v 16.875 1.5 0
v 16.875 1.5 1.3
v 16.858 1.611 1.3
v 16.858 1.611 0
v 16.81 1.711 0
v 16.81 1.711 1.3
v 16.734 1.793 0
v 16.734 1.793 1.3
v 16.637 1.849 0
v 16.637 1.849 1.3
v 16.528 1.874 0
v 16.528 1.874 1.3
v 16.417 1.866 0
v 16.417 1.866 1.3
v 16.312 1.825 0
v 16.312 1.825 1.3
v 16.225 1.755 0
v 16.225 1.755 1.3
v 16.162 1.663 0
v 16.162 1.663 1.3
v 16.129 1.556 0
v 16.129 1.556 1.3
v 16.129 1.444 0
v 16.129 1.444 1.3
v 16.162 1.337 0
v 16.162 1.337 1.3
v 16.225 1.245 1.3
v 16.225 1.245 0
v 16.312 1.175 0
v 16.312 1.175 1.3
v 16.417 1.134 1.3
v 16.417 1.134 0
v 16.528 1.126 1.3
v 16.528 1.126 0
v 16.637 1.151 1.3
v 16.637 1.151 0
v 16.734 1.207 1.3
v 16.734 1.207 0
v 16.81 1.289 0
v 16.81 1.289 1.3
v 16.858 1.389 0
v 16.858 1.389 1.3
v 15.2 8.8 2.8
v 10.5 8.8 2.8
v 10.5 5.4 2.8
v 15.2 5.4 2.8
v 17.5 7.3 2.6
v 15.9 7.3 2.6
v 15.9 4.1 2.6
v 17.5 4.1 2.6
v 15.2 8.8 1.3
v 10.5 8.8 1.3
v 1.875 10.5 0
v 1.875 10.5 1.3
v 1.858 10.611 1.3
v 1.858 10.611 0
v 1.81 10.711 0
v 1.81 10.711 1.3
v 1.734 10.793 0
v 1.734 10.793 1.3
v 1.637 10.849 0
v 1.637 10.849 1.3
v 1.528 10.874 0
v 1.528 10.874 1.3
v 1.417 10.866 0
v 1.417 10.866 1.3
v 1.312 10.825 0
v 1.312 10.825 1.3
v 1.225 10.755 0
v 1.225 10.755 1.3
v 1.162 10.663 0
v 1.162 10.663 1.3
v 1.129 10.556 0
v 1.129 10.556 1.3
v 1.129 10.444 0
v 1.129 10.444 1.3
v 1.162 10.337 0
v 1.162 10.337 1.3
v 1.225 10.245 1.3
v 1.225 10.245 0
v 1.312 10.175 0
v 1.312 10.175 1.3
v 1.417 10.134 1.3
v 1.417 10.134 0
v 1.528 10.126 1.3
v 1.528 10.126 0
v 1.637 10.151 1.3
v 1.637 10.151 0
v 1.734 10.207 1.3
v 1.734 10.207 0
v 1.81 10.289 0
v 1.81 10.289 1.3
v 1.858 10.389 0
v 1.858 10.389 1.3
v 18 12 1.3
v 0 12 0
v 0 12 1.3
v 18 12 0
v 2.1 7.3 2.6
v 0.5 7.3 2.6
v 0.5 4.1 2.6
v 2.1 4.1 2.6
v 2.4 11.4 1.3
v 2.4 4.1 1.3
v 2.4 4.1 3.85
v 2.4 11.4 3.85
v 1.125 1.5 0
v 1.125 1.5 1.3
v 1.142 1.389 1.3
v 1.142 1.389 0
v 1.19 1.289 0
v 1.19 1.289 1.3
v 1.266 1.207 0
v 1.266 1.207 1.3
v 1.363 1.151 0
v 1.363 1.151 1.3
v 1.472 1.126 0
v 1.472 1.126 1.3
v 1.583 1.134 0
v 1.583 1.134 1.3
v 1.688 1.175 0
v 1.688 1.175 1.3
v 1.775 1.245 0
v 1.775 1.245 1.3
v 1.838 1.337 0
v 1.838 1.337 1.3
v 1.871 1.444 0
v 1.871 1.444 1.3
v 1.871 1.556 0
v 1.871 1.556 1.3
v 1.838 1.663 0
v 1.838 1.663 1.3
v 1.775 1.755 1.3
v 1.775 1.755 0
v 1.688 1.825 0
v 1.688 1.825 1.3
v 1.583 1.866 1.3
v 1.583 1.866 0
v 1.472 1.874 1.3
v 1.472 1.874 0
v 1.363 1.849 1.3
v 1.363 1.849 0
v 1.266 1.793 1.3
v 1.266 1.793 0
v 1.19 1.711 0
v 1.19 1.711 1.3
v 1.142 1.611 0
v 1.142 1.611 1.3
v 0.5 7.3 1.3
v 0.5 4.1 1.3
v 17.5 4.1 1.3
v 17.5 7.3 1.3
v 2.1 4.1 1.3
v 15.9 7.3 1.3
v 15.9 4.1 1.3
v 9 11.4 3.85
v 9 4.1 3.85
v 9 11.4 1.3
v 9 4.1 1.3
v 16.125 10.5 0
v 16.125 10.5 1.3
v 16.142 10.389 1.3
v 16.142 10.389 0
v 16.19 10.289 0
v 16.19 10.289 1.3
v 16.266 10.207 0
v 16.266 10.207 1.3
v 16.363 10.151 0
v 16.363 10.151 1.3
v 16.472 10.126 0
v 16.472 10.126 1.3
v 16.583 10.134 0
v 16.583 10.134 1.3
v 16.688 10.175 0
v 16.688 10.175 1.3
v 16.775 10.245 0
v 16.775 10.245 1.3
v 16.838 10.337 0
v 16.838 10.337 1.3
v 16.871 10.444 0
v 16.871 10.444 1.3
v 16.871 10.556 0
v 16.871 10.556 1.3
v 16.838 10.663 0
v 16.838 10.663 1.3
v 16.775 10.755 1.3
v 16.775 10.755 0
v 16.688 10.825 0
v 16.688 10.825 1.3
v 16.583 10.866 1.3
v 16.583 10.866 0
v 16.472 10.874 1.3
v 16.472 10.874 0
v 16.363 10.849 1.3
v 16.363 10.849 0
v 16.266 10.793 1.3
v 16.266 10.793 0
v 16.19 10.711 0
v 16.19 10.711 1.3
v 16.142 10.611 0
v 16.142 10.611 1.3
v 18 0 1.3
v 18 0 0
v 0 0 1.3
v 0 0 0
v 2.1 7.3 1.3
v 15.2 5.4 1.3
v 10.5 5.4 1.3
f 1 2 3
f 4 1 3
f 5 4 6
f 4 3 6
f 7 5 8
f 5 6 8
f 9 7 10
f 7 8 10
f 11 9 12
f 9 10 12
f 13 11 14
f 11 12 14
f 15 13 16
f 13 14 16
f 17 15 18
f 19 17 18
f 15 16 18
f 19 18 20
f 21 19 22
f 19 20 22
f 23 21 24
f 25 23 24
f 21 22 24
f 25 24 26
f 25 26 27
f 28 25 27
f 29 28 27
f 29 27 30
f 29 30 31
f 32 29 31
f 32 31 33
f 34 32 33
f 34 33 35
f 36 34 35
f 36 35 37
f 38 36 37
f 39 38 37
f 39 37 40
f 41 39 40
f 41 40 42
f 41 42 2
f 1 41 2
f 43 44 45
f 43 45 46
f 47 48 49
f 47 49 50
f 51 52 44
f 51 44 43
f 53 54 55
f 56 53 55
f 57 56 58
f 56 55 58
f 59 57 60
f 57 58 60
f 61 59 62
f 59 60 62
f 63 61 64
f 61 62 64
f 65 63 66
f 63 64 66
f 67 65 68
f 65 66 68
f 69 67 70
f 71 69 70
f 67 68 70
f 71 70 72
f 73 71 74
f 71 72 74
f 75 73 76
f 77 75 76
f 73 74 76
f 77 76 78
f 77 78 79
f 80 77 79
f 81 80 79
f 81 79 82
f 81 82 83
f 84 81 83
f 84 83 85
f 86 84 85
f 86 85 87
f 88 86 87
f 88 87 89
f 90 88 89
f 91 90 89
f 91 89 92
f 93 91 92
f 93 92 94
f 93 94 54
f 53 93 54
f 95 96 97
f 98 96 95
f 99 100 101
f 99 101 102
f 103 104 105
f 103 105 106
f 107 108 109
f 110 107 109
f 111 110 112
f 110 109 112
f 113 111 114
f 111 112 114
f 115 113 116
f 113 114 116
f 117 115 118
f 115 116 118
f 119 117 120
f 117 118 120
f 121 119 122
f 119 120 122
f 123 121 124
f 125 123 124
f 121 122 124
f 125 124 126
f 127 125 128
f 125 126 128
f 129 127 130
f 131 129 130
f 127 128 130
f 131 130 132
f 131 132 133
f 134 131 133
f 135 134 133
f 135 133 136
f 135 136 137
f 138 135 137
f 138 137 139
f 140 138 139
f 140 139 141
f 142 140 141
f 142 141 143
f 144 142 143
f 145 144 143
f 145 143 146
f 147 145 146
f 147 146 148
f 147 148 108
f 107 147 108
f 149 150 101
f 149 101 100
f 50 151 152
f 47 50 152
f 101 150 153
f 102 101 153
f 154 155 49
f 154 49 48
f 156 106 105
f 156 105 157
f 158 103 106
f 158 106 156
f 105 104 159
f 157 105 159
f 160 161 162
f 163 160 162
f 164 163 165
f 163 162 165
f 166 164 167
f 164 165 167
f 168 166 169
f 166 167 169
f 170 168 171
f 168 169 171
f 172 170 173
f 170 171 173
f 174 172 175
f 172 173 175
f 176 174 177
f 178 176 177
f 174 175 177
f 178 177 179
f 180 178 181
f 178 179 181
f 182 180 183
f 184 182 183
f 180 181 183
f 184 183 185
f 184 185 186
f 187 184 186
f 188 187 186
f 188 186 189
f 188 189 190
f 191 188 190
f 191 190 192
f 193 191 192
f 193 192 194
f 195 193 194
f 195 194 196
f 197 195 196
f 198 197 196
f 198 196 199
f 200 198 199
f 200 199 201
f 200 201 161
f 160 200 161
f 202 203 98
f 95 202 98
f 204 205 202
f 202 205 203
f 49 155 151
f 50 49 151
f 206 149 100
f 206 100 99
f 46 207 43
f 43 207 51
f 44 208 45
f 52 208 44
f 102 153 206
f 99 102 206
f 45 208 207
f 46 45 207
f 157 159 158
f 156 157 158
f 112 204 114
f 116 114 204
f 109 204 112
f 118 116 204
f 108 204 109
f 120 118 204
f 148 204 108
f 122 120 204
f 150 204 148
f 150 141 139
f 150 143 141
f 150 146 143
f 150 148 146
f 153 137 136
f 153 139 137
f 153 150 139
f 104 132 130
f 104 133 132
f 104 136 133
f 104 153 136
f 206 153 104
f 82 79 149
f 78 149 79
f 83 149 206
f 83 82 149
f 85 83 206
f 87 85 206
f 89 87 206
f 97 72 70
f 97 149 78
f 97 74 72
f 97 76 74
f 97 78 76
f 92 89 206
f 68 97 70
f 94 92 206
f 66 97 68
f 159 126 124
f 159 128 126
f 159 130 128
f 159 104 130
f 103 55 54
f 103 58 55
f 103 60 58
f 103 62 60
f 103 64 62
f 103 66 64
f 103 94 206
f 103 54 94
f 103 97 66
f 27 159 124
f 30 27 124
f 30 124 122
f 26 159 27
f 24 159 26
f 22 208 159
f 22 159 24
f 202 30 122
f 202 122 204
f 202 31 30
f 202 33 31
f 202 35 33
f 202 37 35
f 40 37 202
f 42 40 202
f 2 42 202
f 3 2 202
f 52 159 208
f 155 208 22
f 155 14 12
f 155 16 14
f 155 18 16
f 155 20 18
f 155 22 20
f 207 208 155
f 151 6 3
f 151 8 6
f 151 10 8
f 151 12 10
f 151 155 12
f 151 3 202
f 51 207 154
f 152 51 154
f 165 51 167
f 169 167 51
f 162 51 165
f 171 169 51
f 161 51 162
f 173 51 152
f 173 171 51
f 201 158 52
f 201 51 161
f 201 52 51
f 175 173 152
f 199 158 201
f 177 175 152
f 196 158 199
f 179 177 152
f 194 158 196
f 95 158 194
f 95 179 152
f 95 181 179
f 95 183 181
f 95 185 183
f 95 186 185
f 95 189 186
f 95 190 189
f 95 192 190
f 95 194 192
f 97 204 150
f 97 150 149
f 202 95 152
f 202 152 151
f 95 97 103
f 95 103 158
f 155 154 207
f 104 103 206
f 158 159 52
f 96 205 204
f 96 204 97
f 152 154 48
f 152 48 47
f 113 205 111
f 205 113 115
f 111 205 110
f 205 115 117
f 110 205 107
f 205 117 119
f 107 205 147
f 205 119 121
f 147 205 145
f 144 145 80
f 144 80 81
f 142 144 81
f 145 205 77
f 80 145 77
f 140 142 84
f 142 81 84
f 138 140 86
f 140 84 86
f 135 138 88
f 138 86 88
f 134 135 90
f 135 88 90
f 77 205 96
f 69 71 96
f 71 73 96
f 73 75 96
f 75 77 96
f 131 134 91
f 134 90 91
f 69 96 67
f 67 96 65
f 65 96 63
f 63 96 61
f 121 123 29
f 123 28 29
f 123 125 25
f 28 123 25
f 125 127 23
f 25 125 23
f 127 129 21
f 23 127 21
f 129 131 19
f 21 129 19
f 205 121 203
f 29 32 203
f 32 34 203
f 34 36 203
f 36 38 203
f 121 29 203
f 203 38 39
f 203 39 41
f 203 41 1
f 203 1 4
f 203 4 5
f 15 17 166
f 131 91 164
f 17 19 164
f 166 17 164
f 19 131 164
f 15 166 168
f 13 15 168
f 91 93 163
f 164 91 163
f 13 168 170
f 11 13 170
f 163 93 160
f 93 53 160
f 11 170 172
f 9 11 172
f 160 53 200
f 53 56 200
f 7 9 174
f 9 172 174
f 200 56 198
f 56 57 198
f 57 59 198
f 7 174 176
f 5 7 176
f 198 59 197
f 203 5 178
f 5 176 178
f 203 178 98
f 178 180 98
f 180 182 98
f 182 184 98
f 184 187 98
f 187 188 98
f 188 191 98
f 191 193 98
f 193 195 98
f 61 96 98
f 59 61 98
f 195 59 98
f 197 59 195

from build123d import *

# Parameters (mm, degrees)
SKIZZE1_W                       = 18
SKIZZE1_H                       = 12
PLATINE_DEPTH                   = 1.3
SKIZZE2_W                       = 6.6
SKIZZE2_H                       = 7.3
AUFSATZ_LINEAR_AUSTRAGEN2_DEPTH = 2.55
SKIZZE3_W                       = 4.7
SKIZZE3_H                       = 3.4
AUFSATZ_LINEAR_AUSTRAGEN3_DEPTH = 1.5
SKIZZE4_R                       = 0.375
SCHNITT_LINEAR_AUSTRAGEN1_DEPTH = 22.783078295
SKIZZE5_W                       = 1.6
SKIZZE5_H                       = 3.2
AUFSATZ_LINEAR_AUSTRAGEN4_DEPTH = 1.3


with BuildPart() as part:
    # Skizze1 → Platine (new body)
    with BuildSketch(Plane.XY):
        with Locations((9, 6)):
            Rectangle(SKIZZE1_W, SKIZZE1_H)
    extrude(amount=PLATINE_DEPTH)

    # Skizze2 → Aufsatz-Linear austragen2 (add)
    with BuildSketch(Plane.XY.offset(1.3)):
        with Locations((5.7, 7.75)):
            Rectangle(SKIZZE2_W, SKIZZE2_H)
    extrude(amount=AUFSATZ_LINEAR_AUSTRAGEN2_DEPTH)

    # Skizze3 → Aufsatz-Linear austragen3 (add)
    with BuildSketch(Plane.XY.offset(1.3)):
        with Locations((12.85, 7.1)):
            Rectangle(SKIZZE3_W, SKIZZE3_H)
    extrude(amount=AUFSATZ_LINEAR_AUSTRAGEN3_DEPTH)

    # Skizze4 → Schnitt-Linear austragen1 (cut, through all)
    with BuildSketch(Plane.XY.offset(1.3)):
        with Locations((1.5, 10.5)):
            Circle(SKIZZE4_R)
        with Locations(Location((16.5, 10.5, 0), (0, 0, 180))):
            Circle(SKIZZE4_R)
        with Locations((16.5, 1.5)):
            Circle(SKIZZE4_R)
        with Locations(Location((1.5, 1.5, 0), (0, 0, 180))):
            Circle(SKIZZE4_R)
    extrude(amount=-SCHNITT_LINEAR_AUSTRAGEN1_DEPTH, mode=Mode.SUBTRACT)

    # Skizze5 → Aufsatz-Linear austragen4 (add)
    with BuildSketch(Plane.XY.offset(1.3)):
        with Locations((1.3, 5.7)):
            Rectangle(SKIZZE5_W, SKIZZE5_H)
        with Locations((16.7, 5.7)):
            Rectangle(SKIZZE5_W, SKIZZE5_H)
    extrude(amount=AUFSATZ_LINEAR_AUSTRAGEN4_DEPTH)


solid = part.part
